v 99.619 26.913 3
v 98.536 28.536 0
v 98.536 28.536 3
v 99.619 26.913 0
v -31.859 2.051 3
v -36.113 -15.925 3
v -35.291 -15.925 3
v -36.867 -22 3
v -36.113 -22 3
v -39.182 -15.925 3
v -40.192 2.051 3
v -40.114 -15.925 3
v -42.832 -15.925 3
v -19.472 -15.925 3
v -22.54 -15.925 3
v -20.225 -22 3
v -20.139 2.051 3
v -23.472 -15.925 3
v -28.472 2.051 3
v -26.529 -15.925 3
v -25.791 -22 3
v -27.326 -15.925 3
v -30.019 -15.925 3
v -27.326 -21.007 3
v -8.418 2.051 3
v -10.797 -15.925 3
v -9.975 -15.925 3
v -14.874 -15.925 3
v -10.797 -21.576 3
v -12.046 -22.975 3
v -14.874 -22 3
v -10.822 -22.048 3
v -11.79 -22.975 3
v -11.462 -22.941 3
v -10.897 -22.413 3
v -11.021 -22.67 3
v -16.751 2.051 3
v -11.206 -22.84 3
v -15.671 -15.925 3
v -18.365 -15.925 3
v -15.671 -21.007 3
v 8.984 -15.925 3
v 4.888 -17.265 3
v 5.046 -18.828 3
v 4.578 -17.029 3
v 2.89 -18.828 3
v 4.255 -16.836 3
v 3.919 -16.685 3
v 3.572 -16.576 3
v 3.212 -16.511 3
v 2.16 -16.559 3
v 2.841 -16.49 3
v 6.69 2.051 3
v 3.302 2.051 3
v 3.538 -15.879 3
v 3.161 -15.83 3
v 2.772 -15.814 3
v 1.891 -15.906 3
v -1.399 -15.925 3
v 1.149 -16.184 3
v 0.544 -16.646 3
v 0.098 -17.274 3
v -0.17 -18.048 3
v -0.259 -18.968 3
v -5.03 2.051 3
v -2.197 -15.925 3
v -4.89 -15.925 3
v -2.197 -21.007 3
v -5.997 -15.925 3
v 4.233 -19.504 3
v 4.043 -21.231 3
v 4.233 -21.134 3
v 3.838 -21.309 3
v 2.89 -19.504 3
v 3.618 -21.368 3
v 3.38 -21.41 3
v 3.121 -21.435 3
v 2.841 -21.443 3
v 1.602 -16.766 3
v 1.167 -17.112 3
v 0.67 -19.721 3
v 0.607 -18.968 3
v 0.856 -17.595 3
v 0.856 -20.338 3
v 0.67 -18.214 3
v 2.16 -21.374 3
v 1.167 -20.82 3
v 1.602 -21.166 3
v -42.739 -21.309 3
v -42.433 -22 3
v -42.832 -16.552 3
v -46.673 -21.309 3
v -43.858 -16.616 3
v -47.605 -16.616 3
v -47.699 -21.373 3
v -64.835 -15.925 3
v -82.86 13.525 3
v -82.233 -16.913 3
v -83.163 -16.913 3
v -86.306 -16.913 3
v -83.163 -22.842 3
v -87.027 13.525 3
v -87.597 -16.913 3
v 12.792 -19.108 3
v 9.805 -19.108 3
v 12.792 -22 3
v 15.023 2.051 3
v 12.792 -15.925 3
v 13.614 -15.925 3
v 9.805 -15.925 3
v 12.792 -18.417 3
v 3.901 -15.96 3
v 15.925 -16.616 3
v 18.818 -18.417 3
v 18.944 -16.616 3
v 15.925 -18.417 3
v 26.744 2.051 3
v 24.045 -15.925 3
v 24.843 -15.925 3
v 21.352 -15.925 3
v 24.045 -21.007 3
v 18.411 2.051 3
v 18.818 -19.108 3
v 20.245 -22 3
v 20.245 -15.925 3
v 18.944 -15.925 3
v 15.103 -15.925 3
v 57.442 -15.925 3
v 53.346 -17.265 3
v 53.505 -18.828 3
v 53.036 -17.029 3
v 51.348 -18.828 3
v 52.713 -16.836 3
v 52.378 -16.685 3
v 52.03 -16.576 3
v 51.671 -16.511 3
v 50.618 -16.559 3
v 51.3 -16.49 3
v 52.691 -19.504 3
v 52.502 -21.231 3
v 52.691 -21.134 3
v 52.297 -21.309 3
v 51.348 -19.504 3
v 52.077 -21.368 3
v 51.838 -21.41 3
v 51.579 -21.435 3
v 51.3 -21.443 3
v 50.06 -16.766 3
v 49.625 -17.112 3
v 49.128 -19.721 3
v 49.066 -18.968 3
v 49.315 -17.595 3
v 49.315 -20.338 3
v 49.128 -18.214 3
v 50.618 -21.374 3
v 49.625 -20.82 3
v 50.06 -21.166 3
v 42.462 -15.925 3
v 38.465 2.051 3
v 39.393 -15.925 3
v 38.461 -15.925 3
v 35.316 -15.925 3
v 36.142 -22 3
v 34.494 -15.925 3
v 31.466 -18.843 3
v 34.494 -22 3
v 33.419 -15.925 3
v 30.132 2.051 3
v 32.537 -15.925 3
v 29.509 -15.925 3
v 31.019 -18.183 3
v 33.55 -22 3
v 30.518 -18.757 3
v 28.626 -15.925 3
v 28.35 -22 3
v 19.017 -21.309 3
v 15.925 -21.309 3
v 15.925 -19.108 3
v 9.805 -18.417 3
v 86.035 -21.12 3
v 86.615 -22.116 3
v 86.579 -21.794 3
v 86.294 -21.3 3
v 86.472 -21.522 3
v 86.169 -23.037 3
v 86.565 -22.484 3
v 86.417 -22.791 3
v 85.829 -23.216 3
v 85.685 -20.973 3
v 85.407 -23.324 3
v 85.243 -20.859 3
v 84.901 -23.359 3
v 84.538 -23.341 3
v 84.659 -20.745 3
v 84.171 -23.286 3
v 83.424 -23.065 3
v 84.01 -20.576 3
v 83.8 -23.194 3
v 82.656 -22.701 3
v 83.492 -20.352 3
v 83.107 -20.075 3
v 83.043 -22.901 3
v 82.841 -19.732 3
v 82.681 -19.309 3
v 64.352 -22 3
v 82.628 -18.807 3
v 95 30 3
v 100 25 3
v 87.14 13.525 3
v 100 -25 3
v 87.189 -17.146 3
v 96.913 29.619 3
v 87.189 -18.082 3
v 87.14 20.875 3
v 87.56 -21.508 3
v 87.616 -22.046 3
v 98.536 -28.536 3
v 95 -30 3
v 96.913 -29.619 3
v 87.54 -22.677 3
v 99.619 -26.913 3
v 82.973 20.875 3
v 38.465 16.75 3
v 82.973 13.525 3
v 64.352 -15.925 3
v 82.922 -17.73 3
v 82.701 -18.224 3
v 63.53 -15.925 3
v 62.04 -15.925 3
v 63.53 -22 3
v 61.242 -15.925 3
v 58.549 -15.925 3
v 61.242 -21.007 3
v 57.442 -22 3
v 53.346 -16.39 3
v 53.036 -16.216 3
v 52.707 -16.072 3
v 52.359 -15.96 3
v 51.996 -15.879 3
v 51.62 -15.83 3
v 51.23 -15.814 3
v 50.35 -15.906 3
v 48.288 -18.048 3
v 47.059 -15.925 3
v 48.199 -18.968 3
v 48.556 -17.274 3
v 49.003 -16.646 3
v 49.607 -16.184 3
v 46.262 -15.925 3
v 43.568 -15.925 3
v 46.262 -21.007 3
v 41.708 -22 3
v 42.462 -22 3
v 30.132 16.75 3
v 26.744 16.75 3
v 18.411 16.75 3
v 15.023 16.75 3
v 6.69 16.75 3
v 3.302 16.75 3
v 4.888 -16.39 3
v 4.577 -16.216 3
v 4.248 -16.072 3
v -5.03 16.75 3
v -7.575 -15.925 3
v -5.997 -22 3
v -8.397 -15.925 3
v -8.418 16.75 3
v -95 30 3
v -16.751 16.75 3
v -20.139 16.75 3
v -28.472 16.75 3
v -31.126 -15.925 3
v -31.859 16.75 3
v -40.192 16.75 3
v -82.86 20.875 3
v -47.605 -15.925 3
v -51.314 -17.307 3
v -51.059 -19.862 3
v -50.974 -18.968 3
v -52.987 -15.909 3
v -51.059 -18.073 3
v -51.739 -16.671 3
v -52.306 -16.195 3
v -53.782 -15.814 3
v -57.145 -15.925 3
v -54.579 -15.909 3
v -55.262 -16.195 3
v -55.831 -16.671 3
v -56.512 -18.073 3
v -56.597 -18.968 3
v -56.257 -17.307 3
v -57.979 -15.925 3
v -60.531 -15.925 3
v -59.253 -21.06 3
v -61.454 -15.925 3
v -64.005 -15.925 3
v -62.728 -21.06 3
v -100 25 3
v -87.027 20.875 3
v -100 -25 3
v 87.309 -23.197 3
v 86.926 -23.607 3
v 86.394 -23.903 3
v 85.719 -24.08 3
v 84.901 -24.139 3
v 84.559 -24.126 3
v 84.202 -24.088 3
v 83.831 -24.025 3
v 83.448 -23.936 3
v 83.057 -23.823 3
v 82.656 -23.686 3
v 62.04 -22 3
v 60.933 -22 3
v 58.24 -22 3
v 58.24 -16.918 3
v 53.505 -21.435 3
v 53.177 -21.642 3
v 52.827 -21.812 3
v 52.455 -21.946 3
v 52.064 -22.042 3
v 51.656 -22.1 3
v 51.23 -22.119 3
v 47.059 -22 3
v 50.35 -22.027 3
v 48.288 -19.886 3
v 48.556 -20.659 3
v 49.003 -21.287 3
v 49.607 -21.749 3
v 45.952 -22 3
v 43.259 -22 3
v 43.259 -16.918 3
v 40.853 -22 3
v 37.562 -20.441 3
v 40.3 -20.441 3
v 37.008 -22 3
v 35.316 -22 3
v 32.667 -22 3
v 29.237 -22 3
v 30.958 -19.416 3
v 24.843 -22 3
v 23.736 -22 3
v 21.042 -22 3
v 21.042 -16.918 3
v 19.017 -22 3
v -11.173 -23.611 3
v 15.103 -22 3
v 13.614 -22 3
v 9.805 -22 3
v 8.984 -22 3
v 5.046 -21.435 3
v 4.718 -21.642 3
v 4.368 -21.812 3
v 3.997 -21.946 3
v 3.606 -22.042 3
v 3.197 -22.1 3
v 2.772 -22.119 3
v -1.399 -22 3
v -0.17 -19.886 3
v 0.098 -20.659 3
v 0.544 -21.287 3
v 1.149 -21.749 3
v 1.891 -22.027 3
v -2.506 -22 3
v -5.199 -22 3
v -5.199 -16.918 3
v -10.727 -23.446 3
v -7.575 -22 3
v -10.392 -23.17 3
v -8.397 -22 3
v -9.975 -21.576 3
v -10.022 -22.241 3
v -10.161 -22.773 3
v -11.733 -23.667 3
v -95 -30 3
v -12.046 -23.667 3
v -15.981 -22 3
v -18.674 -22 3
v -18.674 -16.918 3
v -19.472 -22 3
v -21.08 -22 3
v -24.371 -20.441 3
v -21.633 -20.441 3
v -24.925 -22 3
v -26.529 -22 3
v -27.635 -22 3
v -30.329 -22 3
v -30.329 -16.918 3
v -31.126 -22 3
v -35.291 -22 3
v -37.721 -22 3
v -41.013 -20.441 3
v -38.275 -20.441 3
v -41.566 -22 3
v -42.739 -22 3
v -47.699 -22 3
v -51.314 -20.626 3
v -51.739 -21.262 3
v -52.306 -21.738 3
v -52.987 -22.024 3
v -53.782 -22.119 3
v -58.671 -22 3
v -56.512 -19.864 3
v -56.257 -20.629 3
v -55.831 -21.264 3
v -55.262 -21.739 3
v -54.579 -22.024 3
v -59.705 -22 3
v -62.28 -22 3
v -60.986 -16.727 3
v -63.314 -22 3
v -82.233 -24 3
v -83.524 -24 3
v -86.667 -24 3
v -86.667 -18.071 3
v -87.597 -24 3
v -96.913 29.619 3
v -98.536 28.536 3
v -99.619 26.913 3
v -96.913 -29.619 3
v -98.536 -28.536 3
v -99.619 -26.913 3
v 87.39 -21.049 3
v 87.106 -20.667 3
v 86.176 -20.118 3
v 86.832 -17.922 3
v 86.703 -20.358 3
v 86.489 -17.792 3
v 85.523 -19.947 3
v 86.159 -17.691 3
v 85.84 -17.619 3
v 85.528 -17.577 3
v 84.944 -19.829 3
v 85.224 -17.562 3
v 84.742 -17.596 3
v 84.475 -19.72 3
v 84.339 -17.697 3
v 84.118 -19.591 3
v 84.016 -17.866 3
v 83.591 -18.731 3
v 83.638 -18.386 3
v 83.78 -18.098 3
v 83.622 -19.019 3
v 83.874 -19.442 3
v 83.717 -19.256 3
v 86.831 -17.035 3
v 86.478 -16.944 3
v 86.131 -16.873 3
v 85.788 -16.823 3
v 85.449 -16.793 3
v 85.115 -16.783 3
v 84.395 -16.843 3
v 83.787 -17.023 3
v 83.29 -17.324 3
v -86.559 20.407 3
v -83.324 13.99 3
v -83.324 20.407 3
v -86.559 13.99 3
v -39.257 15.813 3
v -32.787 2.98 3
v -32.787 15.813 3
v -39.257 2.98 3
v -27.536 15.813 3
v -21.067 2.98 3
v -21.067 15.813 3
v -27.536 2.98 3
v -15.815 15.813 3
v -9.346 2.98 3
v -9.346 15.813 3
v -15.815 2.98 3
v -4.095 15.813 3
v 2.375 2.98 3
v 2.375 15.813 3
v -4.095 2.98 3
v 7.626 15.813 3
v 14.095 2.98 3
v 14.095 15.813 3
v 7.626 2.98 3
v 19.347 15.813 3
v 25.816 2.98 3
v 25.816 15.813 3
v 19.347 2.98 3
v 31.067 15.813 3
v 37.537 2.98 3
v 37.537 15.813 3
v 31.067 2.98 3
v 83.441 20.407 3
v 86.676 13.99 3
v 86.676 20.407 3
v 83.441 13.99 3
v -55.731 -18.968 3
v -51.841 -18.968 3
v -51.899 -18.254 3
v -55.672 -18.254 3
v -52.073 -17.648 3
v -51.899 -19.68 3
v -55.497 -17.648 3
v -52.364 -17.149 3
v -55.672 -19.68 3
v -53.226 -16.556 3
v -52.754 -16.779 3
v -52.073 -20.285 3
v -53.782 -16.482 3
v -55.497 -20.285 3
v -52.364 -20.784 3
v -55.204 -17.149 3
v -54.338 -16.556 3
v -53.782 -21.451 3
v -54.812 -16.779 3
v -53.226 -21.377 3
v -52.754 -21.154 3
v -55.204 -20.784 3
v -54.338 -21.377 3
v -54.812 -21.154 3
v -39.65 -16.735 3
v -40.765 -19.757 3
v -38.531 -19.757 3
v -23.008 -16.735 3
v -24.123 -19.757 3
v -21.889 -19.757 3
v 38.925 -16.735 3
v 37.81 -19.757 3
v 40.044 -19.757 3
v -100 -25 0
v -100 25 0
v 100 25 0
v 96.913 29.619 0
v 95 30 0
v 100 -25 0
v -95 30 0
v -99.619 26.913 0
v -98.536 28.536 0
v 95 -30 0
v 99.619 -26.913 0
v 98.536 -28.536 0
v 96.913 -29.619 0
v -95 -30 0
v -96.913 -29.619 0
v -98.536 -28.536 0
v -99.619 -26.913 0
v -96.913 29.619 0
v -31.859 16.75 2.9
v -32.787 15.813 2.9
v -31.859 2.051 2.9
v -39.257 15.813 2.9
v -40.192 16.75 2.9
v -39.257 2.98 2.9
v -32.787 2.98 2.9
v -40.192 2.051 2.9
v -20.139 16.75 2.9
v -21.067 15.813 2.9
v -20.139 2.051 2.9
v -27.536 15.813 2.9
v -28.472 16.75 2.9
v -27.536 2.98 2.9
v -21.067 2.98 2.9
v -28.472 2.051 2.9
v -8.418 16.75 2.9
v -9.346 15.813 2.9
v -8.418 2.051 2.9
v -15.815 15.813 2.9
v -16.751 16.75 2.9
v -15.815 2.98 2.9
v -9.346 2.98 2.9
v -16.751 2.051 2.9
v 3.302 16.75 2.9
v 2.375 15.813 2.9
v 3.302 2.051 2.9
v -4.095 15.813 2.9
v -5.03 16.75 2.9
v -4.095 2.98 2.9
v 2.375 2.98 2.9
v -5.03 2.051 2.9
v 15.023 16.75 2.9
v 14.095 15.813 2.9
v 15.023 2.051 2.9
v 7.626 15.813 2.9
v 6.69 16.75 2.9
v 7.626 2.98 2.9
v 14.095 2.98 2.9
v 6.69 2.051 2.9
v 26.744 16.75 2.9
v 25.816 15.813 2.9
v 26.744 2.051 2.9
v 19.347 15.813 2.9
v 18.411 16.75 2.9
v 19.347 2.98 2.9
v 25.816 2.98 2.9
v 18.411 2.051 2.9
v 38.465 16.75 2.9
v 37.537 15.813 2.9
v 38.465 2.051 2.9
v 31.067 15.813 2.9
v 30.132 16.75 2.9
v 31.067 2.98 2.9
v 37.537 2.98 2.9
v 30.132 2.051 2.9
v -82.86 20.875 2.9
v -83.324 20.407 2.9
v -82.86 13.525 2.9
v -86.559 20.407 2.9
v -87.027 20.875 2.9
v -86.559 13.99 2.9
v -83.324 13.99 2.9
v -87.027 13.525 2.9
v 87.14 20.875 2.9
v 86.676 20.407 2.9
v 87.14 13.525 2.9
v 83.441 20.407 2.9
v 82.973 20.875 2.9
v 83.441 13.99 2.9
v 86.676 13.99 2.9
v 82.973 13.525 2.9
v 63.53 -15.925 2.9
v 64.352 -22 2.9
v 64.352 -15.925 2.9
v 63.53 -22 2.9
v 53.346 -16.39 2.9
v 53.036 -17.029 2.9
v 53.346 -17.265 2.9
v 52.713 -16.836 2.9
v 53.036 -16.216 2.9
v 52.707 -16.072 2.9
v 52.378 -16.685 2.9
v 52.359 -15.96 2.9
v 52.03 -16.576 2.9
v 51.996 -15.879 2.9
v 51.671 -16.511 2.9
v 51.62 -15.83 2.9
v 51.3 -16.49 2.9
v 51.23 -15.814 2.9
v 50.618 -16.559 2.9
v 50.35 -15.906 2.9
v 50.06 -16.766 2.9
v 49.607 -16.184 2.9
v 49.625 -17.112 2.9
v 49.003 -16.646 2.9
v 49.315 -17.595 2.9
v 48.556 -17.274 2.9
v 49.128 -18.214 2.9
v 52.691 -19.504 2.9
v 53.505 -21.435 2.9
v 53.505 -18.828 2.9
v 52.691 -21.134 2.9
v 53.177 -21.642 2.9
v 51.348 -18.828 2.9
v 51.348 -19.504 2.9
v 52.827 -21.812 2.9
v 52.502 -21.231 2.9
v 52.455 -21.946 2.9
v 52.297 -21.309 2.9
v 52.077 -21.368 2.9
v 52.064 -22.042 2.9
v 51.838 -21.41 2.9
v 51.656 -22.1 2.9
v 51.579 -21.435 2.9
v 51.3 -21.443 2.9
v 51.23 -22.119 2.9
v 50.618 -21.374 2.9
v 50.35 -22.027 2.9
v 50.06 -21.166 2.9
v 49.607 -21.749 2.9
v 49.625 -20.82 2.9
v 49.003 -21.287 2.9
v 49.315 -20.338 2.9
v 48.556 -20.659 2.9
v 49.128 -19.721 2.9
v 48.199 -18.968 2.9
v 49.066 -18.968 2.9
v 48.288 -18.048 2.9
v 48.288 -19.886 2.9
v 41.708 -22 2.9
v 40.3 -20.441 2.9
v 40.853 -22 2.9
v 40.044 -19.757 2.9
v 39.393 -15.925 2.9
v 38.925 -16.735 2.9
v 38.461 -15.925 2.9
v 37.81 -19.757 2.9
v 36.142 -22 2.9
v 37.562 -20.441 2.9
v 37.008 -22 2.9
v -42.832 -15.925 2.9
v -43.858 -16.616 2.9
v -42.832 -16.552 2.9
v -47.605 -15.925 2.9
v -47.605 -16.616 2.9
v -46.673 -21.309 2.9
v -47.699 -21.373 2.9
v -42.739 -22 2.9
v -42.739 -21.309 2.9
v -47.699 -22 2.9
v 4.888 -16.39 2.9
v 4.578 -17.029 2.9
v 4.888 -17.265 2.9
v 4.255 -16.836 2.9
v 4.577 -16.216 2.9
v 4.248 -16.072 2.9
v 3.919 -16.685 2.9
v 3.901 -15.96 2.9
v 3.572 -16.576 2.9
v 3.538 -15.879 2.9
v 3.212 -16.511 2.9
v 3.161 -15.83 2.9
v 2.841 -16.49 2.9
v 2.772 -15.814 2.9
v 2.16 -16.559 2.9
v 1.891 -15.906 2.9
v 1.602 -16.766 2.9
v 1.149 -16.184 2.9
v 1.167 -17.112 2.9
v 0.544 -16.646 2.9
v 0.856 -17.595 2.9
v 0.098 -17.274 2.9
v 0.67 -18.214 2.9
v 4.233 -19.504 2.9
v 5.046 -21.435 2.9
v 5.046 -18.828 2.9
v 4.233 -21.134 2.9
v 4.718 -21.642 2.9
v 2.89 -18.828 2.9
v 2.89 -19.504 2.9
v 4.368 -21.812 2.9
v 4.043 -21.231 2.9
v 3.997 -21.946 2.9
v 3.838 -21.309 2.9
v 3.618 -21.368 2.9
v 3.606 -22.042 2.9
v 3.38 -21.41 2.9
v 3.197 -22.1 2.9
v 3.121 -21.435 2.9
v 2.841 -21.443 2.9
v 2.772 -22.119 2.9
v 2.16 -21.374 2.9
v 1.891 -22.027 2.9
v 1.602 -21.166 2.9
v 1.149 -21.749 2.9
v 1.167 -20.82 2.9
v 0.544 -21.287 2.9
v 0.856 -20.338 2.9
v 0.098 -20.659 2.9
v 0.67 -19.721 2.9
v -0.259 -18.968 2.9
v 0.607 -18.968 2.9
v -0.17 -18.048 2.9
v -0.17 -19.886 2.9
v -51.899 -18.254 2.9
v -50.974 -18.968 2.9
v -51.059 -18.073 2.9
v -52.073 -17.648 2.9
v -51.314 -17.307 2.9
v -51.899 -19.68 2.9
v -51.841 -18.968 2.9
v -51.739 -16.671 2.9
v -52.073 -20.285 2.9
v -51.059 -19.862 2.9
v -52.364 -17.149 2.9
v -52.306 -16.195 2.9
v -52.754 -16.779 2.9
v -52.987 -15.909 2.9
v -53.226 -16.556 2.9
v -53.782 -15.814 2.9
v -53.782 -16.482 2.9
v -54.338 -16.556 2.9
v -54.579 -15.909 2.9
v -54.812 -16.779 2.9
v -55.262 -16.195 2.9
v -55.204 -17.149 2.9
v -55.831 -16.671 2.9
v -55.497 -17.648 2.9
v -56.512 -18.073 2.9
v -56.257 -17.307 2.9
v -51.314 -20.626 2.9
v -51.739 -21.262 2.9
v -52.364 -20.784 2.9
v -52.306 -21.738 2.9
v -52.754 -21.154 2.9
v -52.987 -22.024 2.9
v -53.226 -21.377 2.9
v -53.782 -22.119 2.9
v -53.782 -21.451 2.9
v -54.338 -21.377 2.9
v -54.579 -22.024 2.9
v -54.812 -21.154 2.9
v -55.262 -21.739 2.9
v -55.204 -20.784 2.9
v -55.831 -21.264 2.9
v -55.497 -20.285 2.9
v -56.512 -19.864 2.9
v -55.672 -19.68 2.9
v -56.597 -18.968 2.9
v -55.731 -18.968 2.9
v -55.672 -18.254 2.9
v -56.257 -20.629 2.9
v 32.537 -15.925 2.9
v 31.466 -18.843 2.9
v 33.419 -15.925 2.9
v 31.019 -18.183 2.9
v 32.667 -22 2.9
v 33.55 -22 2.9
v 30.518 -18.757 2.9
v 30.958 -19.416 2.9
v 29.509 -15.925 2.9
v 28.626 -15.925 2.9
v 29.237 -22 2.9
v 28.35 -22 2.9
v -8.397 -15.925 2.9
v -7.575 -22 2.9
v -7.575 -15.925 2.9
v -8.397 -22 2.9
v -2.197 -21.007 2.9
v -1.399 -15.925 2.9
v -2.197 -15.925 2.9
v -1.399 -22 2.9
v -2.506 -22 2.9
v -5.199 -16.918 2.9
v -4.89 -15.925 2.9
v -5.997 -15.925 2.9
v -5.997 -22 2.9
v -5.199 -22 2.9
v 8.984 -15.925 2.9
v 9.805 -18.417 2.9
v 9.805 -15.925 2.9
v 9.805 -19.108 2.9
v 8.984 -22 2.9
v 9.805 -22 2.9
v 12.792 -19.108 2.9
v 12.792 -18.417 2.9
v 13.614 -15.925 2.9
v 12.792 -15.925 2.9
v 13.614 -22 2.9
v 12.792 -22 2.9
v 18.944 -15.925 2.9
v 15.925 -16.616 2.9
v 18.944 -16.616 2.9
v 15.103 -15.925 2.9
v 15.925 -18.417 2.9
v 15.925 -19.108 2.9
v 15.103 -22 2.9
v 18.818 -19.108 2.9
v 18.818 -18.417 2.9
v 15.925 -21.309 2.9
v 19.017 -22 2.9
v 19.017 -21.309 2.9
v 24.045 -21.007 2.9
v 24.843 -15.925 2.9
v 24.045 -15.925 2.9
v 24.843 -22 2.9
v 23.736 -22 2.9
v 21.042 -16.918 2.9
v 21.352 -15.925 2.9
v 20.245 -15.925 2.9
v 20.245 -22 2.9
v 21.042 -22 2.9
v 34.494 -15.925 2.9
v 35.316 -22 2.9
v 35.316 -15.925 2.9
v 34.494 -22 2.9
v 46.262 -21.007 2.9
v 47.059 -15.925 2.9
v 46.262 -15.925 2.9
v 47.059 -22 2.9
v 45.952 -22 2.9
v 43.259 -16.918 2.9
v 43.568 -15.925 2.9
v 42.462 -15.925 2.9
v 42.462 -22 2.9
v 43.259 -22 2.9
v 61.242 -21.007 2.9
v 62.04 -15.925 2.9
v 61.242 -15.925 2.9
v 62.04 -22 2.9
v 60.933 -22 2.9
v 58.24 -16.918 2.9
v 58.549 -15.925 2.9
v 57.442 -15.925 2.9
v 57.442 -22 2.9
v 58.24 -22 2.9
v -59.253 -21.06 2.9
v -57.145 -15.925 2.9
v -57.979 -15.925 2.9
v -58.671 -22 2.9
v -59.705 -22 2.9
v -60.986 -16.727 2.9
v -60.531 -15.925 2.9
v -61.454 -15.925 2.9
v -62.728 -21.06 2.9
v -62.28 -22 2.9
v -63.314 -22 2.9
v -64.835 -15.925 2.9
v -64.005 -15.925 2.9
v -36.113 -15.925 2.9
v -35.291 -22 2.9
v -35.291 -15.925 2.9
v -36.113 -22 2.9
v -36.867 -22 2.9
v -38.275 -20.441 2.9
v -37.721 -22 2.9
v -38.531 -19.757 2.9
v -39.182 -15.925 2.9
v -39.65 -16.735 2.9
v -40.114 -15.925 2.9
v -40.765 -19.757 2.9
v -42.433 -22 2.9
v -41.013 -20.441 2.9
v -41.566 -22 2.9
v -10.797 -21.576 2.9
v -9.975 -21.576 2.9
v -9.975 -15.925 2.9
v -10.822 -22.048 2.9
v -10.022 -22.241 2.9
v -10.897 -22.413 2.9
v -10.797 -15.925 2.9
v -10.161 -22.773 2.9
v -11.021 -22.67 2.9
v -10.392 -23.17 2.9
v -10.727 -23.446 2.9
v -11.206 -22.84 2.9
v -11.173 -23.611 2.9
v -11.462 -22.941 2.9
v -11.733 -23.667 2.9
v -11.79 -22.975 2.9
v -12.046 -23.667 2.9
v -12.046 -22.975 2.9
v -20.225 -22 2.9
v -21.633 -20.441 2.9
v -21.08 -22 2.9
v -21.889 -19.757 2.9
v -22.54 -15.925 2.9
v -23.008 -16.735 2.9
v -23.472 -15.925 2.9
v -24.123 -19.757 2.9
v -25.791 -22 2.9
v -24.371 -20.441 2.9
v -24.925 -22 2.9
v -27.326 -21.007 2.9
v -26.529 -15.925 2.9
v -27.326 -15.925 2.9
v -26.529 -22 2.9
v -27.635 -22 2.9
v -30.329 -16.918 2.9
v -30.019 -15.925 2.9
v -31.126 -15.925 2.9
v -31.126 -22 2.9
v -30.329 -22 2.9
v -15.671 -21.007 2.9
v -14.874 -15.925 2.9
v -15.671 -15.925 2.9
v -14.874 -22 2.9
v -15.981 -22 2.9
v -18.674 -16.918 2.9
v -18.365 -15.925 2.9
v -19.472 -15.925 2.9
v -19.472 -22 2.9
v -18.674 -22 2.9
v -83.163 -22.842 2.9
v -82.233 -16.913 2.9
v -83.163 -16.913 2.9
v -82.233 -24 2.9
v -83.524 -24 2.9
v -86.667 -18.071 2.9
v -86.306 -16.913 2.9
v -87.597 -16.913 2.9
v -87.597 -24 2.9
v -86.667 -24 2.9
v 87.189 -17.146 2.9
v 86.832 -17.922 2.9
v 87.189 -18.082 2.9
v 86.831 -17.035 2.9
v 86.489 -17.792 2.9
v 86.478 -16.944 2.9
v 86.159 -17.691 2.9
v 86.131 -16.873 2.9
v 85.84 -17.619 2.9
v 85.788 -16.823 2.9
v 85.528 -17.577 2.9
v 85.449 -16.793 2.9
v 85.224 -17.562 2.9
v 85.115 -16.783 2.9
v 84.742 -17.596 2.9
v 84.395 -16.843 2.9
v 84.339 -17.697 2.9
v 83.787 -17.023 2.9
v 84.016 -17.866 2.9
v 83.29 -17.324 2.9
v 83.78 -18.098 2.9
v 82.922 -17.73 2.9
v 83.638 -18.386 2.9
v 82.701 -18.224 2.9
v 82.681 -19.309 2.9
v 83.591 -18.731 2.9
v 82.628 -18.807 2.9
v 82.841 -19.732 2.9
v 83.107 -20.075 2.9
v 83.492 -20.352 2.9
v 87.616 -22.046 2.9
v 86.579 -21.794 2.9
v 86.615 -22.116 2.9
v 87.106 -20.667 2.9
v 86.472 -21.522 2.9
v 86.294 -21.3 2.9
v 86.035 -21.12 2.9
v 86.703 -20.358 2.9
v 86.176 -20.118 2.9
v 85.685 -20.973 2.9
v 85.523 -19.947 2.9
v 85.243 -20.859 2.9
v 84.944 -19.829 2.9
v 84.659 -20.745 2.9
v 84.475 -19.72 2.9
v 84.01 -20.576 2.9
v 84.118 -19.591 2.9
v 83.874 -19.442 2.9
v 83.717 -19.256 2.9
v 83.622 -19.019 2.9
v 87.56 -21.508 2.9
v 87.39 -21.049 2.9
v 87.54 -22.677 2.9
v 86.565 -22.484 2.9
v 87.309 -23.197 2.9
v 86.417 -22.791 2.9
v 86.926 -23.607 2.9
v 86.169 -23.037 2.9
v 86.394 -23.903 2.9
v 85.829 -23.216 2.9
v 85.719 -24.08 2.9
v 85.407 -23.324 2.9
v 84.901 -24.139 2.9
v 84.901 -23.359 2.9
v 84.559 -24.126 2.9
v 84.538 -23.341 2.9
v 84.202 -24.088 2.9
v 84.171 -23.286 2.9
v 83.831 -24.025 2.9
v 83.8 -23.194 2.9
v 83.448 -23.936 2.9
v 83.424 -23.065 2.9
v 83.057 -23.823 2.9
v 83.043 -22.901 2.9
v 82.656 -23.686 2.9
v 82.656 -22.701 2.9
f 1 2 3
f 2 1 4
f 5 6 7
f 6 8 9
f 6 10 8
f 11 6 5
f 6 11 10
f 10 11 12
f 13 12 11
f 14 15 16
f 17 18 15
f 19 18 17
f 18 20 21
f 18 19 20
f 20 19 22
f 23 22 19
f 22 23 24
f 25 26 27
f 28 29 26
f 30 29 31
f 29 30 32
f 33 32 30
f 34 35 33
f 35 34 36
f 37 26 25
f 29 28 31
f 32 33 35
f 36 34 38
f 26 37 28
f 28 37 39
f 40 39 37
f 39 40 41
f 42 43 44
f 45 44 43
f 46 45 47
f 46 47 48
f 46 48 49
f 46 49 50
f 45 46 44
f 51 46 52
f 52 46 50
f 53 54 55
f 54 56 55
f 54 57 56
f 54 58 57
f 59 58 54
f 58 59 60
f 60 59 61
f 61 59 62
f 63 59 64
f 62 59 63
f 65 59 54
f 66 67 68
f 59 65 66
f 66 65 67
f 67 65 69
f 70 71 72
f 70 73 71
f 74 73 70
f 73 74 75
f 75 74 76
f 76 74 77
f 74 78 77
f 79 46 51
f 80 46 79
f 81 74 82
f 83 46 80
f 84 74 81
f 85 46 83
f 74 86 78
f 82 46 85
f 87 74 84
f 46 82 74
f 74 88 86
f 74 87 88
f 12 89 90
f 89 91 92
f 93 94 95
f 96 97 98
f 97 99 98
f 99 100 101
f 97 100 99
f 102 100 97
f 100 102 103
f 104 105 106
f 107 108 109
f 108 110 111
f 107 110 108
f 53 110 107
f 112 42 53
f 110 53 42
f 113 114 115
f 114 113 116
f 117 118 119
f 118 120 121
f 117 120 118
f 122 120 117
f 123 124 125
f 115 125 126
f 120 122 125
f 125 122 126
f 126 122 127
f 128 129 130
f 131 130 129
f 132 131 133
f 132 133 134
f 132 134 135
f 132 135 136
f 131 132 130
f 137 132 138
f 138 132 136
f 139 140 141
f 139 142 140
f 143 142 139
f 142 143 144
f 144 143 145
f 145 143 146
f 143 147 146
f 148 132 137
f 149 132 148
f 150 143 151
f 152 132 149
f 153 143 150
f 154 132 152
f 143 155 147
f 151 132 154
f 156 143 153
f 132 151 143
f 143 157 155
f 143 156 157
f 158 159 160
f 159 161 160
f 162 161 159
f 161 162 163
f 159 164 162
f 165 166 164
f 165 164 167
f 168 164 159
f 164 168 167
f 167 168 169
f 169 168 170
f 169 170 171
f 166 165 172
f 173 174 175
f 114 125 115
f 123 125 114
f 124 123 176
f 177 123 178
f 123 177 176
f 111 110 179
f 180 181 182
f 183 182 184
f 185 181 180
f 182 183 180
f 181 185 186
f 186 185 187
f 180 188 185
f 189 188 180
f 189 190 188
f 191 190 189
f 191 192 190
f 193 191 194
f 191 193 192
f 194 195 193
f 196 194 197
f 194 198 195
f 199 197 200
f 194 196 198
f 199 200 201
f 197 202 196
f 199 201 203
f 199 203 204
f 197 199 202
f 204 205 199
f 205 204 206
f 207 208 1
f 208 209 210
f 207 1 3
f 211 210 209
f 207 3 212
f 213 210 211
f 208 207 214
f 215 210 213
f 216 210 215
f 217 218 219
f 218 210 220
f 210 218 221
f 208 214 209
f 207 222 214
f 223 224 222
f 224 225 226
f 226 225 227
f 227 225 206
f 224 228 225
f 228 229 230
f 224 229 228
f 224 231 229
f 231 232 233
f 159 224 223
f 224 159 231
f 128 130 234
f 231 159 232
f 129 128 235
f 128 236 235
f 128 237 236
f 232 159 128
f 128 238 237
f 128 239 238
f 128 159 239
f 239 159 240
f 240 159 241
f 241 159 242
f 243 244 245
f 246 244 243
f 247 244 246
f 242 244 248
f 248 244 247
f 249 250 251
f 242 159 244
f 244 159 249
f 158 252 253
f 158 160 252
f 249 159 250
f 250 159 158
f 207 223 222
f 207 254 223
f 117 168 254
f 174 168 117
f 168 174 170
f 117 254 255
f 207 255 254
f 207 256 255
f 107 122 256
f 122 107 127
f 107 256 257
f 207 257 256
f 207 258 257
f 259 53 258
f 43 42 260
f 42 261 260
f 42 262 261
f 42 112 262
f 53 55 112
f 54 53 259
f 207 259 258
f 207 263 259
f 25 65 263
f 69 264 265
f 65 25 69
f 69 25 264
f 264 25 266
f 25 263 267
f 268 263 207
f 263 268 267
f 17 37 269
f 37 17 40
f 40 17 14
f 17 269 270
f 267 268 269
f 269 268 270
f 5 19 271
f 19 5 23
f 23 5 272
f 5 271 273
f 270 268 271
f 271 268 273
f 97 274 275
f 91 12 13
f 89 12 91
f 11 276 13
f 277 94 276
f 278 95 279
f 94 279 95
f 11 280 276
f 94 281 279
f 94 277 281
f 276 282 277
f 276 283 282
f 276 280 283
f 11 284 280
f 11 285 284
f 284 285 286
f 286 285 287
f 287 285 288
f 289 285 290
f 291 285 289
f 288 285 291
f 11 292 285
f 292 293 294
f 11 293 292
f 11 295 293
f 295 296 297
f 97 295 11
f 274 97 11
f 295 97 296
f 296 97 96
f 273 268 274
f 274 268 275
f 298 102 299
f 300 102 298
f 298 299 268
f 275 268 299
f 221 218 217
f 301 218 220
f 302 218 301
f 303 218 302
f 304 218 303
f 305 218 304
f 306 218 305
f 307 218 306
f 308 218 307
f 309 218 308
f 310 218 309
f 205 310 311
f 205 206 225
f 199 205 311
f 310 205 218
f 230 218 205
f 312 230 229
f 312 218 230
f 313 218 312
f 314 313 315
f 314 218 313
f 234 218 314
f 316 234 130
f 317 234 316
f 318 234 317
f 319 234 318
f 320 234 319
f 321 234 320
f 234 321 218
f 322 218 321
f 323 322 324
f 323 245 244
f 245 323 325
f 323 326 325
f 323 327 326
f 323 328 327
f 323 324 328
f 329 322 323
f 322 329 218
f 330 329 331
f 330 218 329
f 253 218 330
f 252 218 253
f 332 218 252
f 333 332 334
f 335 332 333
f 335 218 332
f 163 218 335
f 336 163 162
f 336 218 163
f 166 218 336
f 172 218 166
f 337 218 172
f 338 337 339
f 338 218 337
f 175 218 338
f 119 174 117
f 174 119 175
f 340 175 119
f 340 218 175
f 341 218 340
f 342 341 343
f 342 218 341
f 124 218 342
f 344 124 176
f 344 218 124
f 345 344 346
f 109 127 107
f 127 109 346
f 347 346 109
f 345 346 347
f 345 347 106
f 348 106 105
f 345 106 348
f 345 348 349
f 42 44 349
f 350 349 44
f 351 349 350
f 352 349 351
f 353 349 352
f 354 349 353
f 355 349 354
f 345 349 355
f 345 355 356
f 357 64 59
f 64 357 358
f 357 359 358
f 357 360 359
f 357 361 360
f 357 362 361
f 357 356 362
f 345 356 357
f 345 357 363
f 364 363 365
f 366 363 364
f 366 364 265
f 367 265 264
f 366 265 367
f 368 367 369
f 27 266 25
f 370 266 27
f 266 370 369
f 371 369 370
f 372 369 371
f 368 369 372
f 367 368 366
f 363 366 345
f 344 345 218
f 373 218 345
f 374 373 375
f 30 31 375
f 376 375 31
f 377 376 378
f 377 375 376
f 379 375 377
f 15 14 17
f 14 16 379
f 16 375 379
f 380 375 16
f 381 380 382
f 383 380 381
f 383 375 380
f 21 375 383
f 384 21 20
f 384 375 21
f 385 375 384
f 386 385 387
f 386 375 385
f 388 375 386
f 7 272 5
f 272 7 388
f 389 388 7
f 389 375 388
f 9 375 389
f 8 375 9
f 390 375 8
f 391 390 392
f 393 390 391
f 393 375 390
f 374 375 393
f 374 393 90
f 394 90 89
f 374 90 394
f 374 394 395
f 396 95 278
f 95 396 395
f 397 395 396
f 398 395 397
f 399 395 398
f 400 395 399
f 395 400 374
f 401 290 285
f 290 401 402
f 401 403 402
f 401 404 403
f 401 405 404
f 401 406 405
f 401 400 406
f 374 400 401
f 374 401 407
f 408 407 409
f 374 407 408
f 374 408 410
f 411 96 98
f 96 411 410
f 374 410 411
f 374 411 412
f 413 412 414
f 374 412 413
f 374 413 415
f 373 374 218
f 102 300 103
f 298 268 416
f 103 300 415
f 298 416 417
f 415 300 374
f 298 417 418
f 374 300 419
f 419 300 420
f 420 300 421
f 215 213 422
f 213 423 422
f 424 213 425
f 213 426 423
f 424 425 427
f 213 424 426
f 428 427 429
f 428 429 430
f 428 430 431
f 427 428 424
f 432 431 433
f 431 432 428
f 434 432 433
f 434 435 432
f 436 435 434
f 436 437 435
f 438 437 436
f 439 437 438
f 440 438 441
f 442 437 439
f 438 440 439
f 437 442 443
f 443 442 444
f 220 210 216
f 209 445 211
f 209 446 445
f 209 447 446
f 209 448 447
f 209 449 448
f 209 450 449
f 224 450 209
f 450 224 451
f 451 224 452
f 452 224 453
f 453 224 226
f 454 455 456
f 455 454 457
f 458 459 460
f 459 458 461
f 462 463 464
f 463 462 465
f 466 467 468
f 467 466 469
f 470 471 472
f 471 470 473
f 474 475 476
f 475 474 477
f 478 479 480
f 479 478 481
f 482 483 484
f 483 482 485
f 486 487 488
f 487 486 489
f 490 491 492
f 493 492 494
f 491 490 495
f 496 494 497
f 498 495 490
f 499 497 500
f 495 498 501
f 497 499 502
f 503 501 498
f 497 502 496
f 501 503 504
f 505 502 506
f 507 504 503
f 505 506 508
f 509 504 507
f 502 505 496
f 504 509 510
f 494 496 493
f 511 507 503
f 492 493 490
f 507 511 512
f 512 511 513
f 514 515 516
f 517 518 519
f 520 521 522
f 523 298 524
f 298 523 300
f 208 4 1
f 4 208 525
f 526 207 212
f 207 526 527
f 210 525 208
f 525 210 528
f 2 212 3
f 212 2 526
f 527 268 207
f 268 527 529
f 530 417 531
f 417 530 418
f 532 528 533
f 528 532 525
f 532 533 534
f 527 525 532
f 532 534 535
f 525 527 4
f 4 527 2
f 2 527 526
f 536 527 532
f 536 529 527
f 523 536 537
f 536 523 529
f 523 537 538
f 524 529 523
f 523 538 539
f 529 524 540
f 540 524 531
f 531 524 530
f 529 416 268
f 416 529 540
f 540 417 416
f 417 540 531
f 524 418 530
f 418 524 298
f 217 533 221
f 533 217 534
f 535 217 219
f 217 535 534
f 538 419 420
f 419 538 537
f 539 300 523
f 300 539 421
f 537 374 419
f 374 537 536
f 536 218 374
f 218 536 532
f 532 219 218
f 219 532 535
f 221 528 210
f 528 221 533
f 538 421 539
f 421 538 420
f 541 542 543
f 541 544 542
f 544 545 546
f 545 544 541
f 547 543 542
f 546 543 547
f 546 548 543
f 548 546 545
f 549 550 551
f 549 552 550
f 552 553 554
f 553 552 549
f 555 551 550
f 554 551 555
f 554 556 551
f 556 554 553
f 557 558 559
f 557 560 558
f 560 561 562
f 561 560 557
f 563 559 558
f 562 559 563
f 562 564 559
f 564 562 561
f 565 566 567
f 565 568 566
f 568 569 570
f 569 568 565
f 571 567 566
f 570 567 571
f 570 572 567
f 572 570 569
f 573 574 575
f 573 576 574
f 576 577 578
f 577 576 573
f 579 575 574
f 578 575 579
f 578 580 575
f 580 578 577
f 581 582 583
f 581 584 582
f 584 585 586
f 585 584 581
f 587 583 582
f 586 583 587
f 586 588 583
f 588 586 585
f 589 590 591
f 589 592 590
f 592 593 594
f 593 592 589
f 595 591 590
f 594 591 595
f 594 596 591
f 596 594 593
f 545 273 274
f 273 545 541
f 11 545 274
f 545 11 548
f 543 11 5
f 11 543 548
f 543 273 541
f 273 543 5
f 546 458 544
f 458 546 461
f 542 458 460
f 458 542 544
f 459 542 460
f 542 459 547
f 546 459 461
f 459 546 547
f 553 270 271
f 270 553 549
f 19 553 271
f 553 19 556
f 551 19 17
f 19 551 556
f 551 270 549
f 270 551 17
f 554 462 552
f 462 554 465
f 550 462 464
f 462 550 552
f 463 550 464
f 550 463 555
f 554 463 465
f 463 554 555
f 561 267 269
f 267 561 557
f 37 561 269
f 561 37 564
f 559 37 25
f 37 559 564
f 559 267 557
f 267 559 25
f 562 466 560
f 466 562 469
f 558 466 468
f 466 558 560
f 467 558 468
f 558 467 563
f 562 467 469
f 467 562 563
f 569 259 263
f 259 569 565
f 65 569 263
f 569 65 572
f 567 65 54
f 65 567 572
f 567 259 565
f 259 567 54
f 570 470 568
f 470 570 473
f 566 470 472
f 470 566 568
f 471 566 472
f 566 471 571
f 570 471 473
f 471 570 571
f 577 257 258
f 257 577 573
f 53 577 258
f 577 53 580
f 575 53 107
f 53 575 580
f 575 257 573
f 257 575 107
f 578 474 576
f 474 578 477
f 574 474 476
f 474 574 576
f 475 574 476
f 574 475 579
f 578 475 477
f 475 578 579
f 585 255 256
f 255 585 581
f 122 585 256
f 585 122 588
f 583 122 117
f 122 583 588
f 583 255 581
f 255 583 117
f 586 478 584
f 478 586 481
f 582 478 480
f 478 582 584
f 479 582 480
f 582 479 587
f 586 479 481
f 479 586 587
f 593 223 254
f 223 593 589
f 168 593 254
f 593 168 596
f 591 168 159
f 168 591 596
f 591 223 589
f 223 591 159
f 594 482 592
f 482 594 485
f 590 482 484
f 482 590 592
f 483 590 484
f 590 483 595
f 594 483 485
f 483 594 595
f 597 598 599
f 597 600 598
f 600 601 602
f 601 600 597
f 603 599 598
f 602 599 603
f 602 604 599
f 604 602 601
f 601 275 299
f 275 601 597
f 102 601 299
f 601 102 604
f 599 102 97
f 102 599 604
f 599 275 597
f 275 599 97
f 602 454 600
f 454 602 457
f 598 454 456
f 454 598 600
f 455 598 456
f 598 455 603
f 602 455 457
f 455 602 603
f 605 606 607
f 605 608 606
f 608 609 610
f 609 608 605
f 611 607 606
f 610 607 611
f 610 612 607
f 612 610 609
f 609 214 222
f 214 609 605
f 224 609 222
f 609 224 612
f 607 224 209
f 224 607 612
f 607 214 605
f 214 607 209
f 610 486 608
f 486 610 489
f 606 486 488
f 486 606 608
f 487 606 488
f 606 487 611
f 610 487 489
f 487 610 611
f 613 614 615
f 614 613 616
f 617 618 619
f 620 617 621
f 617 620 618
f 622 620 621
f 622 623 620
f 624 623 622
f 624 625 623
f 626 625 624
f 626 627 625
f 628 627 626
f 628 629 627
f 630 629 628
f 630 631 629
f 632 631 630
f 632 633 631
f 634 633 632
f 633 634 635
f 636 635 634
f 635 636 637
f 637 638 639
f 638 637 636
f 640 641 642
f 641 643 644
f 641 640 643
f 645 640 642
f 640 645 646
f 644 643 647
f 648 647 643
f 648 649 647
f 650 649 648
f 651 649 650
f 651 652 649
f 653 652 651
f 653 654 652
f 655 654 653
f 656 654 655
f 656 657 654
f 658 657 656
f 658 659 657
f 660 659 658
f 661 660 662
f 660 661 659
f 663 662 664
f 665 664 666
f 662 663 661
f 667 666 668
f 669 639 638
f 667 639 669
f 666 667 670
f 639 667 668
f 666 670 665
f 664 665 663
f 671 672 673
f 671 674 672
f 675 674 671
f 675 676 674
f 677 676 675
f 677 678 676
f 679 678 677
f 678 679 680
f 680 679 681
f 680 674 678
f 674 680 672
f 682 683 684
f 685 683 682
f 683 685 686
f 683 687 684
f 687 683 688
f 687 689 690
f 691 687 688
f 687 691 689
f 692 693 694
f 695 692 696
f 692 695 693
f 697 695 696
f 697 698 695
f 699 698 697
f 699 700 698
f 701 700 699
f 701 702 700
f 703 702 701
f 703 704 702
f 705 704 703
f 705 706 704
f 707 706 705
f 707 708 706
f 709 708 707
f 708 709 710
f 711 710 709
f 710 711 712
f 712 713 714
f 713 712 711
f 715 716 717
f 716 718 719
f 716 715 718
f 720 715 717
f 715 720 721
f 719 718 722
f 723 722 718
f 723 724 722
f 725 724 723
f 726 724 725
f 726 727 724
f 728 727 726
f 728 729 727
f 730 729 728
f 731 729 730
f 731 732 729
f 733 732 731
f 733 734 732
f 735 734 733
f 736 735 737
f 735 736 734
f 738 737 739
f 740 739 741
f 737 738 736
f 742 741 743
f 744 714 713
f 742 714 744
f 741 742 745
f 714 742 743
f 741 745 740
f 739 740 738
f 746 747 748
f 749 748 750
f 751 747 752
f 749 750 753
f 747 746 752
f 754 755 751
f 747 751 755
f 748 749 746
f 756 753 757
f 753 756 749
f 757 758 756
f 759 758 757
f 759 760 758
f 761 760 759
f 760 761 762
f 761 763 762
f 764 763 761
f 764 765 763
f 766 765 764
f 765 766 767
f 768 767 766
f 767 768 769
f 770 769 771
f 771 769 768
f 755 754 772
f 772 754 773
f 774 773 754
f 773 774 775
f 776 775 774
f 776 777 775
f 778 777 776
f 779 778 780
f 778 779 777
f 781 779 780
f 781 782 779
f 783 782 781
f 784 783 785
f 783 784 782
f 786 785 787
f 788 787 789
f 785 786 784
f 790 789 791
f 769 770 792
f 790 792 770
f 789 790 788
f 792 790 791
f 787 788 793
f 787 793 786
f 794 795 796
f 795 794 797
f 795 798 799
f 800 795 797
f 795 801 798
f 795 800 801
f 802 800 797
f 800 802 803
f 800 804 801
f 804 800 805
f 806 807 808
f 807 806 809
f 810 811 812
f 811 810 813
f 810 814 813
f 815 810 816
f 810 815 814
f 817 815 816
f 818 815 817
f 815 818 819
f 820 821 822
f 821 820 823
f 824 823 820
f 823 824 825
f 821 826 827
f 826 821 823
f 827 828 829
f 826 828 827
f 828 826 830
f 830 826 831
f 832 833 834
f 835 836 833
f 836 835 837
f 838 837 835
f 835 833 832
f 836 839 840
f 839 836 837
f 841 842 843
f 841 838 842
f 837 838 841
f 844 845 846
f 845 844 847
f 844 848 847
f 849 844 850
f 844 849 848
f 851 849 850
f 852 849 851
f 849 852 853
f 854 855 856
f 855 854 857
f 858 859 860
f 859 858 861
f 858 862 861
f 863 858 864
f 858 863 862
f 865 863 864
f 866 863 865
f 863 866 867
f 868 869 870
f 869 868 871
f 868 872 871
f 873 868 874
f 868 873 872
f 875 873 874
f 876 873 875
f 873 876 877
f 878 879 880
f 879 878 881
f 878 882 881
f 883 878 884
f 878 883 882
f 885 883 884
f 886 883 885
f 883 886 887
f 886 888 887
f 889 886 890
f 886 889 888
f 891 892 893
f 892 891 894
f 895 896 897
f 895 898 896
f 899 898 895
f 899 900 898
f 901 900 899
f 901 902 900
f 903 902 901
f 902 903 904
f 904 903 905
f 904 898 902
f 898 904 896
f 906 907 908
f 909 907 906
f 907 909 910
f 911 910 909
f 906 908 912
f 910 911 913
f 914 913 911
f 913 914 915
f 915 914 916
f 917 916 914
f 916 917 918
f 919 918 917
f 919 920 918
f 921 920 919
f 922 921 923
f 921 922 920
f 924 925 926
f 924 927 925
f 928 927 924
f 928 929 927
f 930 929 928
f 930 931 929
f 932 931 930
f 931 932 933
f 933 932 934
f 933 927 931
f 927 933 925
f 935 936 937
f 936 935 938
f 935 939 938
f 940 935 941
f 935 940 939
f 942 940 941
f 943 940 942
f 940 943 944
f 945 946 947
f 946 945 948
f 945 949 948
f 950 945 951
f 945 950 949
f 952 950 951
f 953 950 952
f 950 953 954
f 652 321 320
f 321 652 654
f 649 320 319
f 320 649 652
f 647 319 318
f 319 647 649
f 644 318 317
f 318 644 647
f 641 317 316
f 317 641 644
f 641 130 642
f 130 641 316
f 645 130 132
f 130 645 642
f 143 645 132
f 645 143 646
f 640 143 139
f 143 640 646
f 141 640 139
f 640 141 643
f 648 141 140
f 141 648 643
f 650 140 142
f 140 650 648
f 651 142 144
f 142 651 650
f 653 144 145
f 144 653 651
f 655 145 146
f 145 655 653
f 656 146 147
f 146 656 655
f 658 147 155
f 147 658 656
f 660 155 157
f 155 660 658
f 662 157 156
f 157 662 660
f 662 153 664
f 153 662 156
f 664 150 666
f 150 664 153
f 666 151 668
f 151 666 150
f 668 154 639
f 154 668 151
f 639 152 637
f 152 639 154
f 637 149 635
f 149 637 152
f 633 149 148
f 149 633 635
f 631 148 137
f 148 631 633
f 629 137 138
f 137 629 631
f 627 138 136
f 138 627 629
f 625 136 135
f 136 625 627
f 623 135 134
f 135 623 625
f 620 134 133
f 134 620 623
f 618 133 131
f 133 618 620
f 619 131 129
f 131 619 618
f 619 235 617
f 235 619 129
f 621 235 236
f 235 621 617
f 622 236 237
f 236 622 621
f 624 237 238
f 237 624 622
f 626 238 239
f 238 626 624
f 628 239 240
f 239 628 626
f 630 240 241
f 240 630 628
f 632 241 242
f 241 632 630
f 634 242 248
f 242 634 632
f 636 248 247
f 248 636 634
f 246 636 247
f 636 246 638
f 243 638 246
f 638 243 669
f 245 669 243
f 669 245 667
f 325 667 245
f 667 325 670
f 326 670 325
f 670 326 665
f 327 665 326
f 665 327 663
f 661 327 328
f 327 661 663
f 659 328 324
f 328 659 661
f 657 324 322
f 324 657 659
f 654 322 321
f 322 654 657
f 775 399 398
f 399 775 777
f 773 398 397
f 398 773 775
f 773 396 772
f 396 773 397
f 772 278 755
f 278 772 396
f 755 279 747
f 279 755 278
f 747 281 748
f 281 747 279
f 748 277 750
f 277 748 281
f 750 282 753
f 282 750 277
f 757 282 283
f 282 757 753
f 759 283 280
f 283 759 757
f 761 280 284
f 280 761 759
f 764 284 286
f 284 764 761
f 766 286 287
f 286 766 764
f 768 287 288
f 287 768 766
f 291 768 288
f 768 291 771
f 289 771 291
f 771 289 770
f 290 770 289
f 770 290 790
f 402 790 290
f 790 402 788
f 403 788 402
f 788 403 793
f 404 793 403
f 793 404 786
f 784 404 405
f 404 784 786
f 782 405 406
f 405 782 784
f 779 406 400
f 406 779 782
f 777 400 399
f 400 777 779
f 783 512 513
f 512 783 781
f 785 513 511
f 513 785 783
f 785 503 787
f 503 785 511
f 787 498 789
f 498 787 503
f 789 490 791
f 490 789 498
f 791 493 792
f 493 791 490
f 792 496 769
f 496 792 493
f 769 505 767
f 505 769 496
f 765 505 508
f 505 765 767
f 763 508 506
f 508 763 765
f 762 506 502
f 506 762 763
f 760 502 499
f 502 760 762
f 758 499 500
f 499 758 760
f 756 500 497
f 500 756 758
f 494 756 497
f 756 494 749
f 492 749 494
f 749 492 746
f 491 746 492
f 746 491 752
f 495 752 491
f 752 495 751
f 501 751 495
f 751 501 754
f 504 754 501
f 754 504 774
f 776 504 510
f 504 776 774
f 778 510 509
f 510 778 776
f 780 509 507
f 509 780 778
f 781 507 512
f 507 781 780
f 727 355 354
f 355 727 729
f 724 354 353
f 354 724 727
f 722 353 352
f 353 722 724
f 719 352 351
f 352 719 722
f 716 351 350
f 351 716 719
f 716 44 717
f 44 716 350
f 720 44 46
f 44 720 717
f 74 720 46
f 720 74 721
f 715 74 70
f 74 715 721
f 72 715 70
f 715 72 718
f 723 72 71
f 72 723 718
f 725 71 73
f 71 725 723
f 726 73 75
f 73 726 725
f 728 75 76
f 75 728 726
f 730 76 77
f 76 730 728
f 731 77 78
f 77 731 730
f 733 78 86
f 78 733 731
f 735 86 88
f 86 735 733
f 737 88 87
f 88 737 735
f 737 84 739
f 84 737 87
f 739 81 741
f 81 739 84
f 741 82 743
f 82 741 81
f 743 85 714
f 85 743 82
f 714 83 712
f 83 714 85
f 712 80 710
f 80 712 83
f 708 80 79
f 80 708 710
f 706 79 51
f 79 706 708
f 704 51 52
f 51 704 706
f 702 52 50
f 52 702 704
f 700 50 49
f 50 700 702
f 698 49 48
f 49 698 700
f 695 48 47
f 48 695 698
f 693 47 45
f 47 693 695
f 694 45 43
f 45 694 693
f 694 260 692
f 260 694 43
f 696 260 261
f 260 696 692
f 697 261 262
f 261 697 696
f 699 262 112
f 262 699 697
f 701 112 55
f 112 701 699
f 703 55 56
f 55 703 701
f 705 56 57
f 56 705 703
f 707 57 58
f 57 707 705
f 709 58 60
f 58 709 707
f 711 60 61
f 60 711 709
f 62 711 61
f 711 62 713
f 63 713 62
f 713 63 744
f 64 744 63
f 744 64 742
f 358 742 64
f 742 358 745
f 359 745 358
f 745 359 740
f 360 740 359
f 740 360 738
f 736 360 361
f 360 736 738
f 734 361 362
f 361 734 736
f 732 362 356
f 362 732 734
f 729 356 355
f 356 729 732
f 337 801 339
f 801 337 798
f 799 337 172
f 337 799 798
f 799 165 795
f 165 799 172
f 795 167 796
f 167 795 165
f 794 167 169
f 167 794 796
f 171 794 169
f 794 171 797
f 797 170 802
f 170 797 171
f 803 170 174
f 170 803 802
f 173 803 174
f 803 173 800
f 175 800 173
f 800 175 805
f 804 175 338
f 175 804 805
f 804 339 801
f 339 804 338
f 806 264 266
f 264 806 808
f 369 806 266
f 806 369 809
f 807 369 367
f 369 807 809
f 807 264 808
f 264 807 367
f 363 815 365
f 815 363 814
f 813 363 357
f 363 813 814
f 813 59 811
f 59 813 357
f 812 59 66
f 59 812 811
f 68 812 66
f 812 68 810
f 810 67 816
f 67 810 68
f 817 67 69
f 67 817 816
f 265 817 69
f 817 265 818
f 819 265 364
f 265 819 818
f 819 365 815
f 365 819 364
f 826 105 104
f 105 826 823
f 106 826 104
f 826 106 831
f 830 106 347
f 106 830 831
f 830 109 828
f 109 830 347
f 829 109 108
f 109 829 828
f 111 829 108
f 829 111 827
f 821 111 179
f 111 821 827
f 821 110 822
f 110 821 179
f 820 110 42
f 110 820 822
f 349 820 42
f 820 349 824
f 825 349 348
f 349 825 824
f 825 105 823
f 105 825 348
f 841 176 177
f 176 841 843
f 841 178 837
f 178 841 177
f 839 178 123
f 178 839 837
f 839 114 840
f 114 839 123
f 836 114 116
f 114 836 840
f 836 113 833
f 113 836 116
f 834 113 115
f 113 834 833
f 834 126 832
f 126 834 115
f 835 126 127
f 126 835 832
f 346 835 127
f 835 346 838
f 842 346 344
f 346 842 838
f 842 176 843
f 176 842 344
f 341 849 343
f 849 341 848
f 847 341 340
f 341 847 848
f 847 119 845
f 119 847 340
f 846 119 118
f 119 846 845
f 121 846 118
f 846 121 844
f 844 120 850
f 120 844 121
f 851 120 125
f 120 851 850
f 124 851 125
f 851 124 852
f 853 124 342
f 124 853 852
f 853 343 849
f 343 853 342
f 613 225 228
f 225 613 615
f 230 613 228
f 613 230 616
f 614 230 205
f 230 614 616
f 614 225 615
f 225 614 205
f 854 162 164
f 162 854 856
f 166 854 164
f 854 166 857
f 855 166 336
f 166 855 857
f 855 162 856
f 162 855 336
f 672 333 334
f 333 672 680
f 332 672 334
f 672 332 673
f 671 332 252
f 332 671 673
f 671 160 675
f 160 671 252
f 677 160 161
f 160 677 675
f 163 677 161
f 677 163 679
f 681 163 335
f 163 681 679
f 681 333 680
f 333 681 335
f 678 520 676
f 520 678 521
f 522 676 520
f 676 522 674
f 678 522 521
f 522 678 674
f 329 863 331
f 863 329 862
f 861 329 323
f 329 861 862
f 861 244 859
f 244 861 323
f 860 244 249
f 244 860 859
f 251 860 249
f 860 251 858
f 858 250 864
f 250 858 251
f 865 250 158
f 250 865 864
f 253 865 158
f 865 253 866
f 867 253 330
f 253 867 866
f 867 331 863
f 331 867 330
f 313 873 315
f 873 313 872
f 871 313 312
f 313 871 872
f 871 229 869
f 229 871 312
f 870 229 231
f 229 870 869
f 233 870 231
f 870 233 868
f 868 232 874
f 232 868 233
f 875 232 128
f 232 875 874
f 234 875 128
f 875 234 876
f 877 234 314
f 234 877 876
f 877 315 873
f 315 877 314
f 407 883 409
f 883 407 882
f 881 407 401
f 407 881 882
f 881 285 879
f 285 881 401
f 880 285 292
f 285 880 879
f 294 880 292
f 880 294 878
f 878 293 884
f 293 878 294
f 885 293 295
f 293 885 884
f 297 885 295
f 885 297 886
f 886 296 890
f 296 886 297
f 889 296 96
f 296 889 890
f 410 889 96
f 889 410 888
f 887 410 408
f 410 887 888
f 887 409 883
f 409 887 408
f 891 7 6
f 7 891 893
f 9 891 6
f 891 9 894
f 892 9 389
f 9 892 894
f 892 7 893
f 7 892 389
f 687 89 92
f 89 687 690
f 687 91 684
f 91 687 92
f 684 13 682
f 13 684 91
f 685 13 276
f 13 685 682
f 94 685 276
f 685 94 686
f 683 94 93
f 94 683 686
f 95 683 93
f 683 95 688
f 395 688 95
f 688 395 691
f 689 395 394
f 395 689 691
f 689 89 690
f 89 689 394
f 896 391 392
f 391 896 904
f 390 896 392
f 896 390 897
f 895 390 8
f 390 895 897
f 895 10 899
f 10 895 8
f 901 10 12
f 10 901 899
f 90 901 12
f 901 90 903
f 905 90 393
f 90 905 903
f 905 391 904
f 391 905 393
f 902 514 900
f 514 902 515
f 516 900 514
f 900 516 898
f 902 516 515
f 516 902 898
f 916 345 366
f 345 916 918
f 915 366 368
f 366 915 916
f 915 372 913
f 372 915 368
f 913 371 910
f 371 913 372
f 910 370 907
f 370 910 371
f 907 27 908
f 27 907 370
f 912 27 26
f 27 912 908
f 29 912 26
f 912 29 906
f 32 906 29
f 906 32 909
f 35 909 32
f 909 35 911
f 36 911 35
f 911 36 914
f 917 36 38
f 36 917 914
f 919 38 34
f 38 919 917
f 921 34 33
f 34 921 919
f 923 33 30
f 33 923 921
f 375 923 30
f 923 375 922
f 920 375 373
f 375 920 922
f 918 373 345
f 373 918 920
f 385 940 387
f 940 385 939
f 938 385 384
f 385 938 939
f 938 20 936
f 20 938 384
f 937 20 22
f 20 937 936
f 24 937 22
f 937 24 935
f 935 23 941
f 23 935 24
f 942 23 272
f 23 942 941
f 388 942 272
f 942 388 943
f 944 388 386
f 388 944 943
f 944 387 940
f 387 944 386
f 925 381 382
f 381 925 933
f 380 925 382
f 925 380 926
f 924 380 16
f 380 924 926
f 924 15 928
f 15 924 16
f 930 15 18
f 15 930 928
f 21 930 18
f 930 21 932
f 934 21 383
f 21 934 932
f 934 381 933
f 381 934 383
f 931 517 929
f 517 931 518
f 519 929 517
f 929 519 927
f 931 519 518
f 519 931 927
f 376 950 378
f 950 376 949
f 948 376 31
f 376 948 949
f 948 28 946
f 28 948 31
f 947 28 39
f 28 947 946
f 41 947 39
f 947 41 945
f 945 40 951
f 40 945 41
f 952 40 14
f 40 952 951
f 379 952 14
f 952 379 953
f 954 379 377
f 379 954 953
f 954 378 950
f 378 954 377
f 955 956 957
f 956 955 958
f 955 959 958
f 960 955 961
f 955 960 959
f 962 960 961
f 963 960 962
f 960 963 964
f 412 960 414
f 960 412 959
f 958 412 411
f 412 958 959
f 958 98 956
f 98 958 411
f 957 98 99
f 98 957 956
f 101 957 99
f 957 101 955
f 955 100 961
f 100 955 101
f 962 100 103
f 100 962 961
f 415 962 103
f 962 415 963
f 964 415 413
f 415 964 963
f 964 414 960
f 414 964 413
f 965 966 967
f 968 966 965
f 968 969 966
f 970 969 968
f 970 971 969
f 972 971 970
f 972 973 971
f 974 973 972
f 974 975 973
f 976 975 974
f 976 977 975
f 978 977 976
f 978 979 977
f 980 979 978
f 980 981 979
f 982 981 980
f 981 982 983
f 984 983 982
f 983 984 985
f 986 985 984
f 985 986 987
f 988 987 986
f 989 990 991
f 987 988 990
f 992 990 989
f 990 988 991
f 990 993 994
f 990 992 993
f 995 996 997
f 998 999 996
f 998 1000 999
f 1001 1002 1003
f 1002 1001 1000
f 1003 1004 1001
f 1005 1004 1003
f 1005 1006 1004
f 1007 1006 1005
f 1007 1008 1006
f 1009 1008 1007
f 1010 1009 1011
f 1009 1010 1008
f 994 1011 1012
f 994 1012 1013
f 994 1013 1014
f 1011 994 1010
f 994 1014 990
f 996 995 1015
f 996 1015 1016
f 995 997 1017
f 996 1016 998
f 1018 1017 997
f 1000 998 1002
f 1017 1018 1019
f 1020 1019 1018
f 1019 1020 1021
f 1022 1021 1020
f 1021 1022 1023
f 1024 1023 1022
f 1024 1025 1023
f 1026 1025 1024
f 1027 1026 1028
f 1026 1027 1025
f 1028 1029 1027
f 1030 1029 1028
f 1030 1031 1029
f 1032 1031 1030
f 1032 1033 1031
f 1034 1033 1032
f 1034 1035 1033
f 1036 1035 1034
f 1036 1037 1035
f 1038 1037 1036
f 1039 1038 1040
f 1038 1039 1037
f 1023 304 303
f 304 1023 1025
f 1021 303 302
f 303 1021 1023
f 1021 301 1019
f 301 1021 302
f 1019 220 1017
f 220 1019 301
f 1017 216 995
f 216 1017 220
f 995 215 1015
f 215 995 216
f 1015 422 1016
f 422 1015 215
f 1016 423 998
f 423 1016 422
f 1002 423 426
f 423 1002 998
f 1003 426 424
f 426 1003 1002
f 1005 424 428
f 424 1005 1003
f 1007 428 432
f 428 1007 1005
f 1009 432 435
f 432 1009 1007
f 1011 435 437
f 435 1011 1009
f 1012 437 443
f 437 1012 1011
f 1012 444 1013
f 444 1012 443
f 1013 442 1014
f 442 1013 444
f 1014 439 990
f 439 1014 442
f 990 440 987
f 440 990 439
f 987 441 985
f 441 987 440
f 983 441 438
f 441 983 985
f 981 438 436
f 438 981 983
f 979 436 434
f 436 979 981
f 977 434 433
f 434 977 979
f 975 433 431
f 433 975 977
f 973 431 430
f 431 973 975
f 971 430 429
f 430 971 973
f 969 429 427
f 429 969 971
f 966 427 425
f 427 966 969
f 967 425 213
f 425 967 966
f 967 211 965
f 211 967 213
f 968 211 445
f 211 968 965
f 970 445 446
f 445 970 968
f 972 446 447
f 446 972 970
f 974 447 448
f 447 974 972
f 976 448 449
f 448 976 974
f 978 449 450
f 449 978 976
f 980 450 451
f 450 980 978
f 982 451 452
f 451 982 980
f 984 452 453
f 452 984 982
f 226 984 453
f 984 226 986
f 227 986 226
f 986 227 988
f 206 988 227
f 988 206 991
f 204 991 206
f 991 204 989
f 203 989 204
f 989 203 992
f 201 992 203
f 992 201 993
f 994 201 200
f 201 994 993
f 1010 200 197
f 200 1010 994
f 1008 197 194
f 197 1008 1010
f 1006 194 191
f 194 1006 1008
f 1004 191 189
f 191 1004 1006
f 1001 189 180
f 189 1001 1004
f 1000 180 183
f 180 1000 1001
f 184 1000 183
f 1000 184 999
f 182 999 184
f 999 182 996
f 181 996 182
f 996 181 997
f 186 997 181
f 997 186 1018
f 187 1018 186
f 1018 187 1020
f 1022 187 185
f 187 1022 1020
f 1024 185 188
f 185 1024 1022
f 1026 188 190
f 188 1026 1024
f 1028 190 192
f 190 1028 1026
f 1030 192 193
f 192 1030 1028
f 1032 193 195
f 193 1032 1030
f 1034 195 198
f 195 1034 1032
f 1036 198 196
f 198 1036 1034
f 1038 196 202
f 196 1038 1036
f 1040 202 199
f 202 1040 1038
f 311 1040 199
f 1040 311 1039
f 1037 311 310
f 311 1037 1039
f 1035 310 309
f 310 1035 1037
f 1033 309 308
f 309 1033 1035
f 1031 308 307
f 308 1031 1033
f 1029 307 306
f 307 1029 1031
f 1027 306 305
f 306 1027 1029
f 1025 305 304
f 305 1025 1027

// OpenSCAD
// 文字内容
chinese_text = "我在南京很想你"; 
// 拼音内容
pinyin_text = "WO ZAI NAN JING HEN XIANG NI"; 

// 中文字体
chinese_font = "Noto Sans SC:style=Black";
// 拼音字体  
english_font = "Inter Tight:style=SemiBold";  



// 圆角半径   
corner_r = 5; 
// 文字凸起高度
text_height = 1;


/**
* 标牌参数
*/
// 宽度
width = 200;
// 高度  
height = 60;
// 厚度  
depth = 3; 

// 主体
difference() {
    union() {
        // 蓝色主体部分（上面2/3）
        color("RoyalBlue")
        linear_extrude(depth)
        difference() {
            // 整体形状
            offset(r=corner_r)
            offset(r=-corner_r)
            square([width, height], center=true);
            // 减去下面1/3部分
            translate([0, -height/3])
            square([width+1, height/3], center=true);
        }
        
        // 白色底部部分（下面1/3）
        color("White")
        linear_extrude(depth)
        intersection() {
            // 整体形状
            offset(r=corner_r)
            offset(r=-corner_r)
            square([width, height], center=true);
            // 只保留下面1/3部分
            translate([0, -height/3])
            square([width+1, height/3], center=true);
        }
    }
    
    // 白色中文文字（凹入）
    color("White") {
        // 主要中文文字
        translate([0, 5, depth-0.1])
        linear_extrude(0.2)
        text(chinese_text, size=12, spacing=1.2, halign="center", font=chinese_font);
        
        // 北标记
        translate([-width/2+15, height/2-15, depth-0.1])
        linear_extrude(0.2)
        text("北", size=6, halign="center", font=chinese_font);
        
        // 南标记
        translate([width/2-15, height/2-15, depth-0.1])
        linear_extrude(0.2)
        text("南", size=6, halign="center", font=chinese_font);
    }
    
    // 黑色文字（凹入）
    color("Black") {
        // 拼音文字
        translate([0, -22, depth-0.1])
        linear_extrude(0.2)
        text(pinyin_text, size=6, halign="center", font=english_font);
        
        // N标记
        translate([-width/2+15, height/2-54, depth-0.1])
        linear_extrude(0.2)
        text("N", size=7, halign="center", font=english_font);
        
        // S标记
        translate([width/2-15, height/2-54, depth-0.1])
        linear_extrude(0.2)
        text("S", size=7, halign="center", font=english_font);
    }
}
